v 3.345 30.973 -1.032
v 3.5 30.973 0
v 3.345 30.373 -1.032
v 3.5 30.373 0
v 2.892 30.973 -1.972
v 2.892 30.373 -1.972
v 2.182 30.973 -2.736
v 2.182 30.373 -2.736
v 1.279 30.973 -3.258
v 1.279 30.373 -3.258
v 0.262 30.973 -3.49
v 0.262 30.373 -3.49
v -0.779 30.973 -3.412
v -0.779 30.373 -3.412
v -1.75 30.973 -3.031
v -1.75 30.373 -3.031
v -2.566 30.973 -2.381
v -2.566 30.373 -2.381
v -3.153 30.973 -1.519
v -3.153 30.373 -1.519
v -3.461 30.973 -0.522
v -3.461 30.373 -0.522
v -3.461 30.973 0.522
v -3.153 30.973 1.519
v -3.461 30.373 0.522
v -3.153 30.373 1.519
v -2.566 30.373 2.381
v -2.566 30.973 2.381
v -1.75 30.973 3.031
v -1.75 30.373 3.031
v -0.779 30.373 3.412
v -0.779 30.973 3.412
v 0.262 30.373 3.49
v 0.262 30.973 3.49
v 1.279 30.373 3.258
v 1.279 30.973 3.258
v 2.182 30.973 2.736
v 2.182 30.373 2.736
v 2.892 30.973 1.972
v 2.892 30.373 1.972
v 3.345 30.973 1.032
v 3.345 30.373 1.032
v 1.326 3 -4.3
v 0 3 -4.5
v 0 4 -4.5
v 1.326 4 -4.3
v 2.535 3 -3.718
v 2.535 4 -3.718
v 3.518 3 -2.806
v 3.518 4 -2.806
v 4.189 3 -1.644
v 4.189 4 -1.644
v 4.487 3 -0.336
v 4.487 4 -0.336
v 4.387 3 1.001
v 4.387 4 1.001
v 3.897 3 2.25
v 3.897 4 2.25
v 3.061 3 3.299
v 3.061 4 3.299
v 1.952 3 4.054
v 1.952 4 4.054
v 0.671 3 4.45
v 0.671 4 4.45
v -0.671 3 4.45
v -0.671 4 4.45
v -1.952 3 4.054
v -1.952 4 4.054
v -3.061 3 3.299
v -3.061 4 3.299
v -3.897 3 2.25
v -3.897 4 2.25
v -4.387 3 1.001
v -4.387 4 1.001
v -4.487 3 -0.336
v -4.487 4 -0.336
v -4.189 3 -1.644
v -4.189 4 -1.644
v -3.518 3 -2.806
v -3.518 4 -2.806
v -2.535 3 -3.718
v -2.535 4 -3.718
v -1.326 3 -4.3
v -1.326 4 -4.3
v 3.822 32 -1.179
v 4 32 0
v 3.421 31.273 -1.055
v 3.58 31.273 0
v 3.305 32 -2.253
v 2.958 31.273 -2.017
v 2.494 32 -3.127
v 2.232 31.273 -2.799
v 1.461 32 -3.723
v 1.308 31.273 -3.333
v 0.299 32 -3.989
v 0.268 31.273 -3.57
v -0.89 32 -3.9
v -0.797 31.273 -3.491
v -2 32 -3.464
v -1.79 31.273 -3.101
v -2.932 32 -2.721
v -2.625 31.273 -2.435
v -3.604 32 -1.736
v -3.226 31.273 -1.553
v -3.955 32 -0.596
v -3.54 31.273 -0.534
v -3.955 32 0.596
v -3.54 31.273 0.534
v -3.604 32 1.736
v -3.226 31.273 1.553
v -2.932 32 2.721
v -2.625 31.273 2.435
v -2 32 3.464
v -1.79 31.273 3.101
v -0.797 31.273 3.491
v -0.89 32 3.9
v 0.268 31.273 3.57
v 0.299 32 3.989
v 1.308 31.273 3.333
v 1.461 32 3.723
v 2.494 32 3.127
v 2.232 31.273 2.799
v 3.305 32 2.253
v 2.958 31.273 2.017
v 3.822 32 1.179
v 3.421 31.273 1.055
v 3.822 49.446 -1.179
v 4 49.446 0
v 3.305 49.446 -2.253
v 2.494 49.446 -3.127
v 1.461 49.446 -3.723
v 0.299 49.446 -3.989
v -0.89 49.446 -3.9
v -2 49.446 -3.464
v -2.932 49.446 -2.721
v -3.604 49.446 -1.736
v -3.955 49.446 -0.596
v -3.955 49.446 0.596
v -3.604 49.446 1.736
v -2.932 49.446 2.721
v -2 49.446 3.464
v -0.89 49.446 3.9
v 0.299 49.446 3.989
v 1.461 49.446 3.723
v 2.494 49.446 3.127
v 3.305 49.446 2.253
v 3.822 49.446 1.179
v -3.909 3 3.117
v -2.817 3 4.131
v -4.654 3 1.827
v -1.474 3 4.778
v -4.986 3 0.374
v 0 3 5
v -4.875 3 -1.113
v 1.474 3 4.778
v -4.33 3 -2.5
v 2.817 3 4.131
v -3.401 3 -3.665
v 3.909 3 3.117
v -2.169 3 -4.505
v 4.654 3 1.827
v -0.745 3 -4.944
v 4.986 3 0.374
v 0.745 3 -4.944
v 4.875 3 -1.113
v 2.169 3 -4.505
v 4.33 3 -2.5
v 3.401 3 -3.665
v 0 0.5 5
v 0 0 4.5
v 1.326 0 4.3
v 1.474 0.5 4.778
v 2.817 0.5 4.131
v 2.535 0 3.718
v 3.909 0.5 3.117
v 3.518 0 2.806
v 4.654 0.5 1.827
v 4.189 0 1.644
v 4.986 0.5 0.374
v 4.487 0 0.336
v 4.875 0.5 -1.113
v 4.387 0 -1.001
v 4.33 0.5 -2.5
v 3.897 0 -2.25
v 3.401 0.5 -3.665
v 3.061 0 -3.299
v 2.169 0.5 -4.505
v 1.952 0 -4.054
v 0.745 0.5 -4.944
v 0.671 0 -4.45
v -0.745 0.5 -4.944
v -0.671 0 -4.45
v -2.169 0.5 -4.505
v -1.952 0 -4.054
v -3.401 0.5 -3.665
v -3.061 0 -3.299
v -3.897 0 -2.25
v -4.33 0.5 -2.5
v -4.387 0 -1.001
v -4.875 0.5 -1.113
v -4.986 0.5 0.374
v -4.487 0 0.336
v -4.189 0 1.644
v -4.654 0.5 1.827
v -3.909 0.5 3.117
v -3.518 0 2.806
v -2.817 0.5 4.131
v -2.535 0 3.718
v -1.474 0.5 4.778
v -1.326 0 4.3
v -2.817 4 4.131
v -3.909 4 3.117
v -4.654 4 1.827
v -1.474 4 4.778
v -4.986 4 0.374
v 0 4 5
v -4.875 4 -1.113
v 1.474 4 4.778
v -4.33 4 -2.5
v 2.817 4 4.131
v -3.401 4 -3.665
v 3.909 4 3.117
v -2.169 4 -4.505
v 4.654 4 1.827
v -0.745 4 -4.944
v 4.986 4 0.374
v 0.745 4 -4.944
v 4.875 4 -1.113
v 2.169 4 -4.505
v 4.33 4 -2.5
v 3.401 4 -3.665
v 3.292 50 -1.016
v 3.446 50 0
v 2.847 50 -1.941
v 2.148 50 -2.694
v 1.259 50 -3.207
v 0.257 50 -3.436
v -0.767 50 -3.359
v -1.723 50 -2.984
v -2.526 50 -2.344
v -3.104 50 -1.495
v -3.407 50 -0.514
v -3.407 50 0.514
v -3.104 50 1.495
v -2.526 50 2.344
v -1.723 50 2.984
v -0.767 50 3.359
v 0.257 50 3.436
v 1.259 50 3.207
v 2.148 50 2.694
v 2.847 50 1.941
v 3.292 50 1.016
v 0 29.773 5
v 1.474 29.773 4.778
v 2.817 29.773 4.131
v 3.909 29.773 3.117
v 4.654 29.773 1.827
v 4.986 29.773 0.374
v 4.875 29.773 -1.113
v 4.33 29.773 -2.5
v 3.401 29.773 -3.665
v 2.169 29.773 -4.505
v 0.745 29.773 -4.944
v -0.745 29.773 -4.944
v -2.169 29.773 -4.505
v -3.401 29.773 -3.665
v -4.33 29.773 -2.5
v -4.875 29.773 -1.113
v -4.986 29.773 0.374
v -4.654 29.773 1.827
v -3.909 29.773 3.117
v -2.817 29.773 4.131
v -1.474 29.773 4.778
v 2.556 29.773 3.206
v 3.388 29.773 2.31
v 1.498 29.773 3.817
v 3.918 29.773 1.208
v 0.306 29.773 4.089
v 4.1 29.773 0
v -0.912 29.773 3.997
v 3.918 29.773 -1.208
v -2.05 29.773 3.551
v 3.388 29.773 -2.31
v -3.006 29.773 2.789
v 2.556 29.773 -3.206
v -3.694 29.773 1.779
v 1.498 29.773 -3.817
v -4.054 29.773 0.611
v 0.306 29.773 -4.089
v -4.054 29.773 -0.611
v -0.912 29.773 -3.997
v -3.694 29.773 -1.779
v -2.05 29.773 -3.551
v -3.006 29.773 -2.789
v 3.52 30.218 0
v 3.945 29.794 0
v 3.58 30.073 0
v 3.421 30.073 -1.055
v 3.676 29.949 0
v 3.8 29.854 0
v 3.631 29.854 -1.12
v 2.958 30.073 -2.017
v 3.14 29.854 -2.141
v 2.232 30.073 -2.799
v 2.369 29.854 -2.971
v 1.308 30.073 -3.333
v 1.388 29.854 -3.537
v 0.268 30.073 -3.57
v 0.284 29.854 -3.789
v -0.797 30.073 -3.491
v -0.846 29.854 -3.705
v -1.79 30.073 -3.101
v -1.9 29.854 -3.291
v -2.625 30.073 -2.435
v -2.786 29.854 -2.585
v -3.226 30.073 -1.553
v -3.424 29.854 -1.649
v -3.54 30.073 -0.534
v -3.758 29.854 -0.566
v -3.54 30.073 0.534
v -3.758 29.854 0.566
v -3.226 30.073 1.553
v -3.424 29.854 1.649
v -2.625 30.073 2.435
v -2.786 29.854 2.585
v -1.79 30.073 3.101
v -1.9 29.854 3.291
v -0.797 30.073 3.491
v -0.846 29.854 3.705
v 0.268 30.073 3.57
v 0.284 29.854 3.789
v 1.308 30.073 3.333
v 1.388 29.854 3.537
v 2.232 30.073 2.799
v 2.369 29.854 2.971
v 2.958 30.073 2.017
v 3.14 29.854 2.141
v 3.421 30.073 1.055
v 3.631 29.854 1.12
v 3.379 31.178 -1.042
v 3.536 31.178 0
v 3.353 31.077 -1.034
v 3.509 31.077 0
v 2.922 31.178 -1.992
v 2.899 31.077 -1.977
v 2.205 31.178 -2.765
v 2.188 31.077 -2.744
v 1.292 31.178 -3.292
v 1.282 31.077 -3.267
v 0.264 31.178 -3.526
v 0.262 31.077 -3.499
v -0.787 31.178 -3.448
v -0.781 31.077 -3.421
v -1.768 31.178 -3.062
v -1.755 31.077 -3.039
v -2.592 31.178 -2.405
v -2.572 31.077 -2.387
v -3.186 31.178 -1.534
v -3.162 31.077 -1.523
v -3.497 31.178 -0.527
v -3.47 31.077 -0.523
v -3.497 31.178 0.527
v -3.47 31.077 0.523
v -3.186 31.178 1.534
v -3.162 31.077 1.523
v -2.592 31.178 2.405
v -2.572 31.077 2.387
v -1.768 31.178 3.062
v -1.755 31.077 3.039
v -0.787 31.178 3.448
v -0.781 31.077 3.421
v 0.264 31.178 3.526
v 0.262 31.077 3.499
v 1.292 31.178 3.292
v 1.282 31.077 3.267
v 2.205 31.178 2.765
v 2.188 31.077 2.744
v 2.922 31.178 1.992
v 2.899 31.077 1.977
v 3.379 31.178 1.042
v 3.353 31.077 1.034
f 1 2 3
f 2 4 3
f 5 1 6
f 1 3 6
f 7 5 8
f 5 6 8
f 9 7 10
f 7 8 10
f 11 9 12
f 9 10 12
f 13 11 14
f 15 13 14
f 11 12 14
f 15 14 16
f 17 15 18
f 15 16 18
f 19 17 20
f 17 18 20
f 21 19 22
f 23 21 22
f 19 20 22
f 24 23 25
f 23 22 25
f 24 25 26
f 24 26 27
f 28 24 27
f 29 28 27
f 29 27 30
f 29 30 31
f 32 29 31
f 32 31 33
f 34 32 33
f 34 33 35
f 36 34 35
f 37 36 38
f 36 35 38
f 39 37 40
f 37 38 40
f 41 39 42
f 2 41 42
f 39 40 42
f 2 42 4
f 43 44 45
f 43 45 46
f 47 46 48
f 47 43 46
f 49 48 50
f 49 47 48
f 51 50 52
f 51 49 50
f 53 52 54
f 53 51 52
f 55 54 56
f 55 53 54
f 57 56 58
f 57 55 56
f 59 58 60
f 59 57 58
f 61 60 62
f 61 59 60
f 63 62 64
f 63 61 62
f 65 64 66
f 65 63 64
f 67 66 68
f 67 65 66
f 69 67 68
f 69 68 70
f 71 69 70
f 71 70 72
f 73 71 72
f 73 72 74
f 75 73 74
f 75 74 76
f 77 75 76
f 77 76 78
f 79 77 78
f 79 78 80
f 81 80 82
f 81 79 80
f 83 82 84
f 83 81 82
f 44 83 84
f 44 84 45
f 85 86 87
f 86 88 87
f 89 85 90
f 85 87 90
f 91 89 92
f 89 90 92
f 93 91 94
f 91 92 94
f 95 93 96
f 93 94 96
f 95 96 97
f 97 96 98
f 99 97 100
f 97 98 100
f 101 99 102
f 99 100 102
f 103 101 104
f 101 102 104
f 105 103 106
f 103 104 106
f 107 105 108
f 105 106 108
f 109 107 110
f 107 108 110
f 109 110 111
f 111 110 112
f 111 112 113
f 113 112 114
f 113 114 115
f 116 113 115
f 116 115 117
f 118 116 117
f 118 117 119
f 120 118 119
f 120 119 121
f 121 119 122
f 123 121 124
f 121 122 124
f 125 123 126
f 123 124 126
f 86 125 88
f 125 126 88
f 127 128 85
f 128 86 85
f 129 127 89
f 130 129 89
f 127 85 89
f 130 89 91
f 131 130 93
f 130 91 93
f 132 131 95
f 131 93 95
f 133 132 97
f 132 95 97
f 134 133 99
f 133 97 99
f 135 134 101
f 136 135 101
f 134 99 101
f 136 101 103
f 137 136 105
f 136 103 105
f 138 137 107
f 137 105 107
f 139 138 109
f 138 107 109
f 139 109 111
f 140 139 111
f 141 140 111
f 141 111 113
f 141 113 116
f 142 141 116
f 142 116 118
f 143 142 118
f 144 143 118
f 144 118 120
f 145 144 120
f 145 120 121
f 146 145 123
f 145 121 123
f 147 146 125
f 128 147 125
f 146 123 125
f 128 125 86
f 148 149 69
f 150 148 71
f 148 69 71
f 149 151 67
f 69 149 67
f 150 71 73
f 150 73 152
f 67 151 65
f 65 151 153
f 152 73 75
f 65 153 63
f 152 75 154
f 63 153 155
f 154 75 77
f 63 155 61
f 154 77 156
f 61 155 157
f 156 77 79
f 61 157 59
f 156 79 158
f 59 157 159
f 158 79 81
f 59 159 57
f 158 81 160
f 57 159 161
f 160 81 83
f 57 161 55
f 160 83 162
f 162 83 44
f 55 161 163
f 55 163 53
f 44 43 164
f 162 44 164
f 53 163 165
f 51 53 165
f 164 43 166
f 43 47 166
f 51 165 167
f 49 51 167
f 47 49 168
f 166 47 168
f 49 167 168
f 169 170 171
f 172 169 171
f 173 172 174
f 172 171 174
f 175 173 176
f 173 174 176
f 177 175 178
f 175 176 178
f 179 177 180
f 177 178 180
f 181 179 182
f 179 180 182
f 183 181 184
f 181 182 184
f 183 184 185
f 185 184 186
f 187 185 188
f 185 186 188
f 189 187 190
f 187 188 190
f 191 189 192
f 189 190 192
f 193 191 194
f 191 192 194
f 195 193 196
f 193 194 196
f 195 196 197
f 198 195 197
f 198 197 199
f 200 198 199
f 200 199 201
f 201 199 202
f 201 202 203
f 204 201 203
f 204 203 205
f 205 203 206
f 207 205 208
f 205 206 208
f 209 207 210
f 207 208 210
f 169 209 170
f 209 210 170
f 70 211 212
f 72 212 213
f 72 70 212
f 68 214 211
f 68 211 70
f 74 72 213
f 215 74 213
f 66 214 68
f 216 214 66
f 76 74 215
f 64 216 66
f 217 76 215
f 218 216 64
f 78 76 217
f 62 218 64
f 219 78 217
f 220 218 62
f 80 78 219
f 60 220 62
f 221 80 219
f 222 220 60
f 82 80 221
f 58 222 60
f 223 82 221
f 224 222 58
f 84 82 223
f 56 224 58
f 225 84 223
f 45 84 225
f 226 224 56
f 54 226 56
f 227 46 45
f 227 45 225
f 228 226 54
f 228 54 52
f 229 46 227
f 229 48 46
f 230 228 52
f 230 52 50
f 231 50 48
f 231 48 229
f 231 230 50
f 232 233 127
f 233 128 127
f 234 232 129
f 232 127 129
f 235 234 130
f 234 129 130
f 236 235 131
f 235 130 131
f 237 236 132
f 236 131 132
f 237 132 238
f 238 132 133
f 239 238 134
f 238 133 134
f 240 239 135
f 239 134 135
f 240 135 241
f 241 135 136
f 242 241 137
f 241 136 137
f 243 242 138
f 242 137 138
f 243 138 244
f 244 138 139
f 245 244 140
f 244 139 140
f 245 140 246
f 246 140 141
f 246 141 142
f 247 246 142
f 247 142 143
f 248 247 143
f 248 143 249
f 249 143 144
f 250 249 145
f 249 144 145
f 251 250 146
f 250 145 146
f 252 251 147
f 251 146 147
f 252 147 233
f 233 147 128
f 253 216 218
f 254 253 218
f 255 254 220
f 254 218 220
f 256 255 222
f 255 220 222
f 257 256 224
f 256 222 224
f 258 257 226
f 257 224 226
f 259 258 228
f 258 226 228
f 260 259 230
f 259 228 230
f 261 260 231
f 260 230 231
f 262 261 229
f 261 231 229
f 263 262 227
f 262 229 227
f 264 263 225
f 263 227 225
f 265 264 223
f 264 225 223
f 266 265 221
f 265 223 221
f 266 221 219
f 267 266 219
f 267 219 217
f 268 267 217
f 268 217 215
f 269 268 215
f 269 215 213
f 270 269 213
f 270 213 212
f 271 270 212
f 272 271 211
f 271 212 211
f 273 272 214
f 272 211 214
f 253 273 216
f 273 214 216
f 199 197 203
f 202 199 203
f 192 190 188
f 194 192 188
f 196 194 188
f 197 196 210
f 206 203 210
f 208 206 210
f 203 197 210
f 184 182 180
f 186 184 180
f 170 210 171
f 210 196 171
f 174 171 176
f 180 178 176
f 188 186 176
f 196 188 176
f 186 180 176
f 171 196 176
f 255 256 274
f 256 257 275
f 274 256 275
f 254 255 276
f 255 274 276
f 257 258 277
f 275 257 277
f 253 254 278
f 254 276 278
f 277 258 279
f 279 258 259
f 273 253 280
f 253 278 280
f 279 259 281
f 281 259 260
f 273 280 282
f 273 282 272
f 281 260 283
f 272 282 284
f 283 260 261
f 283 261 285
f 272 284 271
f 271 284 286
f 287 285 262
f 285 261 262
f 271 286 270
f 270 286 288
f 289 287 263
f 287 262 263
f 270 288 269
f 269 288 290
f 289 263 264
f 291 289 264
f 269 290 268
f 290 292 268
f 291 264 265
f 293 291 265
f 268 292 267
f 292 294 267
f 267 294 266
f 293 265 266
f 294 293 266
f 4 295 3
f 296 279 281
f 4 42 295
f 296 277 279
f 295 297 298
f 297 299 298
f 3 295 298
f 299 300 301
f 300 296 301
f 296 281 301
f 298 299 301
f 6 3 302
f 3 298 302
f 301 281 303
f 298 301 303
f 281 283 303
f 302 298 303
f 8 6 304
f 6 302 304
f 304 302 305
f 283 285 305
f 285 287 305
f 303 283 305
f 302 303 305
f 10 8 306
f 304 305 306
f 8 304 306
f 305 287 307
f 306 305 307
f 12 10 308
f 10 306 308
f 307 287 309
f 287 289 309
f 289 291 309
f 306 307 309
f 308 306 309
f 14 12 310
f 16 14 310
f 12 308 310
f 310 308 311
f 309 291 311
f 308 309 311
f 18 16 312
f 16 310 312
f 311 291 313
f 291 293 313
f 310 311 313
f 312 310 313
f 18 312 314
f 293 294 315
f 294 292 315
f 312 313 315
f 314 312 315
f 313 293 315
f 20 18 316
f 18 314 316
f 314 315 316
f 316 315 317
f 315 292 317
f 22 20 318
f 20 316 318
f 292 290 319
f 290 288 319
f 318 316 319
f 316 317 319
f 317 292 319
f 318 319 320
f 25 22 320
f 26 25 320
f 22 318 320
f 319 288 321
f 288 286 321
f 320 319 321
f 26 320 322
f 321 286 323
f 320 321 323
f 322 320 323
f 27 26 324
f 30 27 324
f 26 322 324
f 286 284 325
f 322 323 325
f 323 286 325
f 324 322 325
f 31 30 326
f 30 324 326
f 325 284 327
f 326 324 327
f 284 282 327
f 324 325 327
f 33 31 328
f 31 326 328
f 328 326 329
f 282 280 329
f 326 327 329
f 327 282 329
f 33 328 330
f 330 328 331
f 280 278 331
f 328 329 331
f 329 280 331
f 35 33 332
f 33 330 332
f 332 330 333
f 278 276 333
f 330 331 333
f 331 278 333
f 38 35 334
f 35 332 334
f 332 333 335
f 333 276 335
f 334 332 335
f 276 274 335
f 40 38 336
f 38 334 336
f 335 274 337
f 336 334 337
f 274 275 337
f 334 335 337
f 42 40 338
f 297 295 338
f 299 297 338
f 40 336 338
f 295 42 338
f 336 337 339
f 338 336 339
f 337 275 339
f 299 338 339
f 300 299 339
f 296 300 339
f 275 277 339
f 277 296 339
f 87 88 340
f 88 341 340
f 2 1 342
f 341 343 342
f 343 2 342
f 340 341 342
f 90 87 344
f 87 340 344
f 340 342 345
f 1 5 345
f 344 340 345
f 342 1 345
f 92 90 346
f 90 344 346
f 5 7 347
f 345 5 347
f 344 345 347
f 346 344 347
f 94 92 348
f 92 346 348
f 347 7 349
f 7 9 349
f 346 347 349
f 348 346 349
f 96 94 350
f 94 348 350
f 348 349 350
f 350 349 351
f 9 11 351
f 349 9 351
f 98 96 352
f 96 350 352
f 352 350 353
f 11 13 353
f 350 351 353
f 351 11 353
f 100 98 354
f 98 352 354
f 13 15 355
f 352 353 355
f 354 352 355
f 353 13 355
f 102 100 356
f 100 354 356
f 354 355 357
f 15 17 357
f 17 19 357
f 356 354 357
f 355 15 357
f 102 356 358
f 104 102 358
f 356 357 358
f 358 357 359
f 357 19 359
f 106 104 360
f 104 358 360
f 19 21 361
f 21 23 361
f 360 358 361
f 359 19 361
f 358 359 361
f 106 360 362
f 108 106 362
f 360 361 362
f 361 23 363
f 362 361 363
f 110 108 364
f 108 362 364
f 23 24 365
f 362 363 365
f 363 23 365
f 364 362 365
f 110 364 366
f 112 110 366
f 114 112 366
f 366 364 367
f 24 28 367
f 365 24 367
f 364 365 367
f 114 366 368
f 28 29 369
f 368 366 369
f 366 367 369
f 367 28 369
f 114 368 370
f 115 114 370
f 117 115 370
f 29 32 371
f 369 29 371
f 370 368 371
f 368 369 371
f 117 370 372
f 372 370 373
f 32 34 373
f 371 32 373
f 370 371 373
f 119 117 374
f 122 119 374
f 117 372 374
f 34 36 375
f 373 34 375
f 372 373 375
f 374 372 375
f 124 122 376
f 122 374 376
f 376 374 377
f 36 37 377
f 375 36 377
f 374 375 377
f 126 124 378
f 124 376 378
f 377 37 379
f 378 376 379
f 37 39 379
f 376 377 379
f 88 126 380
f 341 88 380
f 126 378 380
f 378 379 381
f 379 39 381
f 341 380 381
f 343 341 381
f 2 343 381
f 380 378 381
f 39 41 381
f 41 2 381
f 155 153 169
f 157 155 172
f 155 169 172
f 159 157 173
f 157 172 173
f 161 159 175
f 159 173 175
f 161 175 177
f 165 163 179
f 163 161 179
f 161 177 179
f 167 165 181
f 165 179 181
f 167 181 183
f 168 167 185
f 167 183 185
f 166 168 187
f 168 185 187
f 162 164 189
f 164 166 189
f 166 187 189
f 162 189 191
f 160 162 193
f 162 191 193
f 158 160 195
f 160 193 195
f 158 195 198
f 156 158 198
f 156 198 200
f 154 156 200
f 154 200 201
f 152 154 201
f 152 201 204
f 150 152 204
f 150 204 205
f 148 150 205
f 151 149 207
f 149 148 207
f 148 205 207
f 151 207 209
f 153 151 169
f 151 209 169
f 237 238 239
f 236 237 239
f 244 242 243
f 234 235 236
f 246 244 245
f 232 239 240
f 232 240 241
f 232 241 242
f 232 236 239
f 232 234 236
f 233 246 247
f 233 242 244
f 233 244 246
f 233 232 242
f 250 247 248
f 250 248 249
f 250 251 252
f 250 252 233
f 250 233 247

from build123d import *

# Parameters (mm, degrees)
SKETCH1_R           = 5
BOSS_EXTRUDE1_DEPTH = 50
CHAMFER1_SIZE       = 0.5
CUT_EXTRUDE2_START  = -3
SKETCH7_R           = 5
SKETCH7_R_2         = 4.5
CUT_EXTRUDE2_DEPTH  = 1


# Read off the part's stored shape, not the designer's step: M8x1.0 Machine Threads Stud1
with BuildPart() as part:
    # Sketch1 → Boss-Extrude1 (new body)
    with BuildSketch(Plane(origin=(0, 0, 0), x_dir=(1, 0, 0), z_dir=(0, 1, 0))):
        with Locations(Location((0, 0, 0), (0, 0, 270))):
            Circle(SKETCH1_R)
    extrude(amount=BOSS_EXTRUDE1_DEPTH)

    # M8x1.0 Machine Threads Stud1 outline → M8x1.0 Machine Threads Stud1 (revolve, cut)
    with BuildSketch(Plane.XY):
        with BuildLine():
            Line((5, 50), (3.4455, 50))
            Line((3.4455, 50), (4, 49.4455))
            Line((4, 49.4455), (4, 32))
            Line((4, 32), (3.580384758, 31.273205081))
            ThreePointArc((3.580384758, 31.273205081), (3.520444504, 31.128496508), (3.5, 30.973205081))
            Line((3.5, 30.973205081), (3.5, 30.373205081))
            ThreePointArc((3.5, 30.373205081), (3.675735931, 29.948941012), (4.1, 29.773205081))
            Line((4.1, 29.773205081), (5, 29.773205081))
            Line((5, 29.773205081), (5, 50))
        make_face()
    revolve(axis=Axis((0, 0, 0), (0, 1, 0)), mode=Mode.SUBTRACT)

    # Chamfer1
    chamfer1_edges = [part.edges().sort_by_distance(p)[0] for p in [
        (0, 0, -5),
    ]]
    chamfer(chamfer1_edges, length=CHAMFER1_SIZE)

    # Sketch7 → Cut-Extrude2 (cut)
    with BuildSketch(Plane.XZ.offset(CUT_EXTRUDE2_START)):
        with Locations(Location((0, 0, 0), (0, 0, 270))):
            Circle(SKETCH7_R)
        with Locations(Location((0, 0, 0), (0, 0, 270))):
            Circle(SKETCH7_R_2, mode=Mode.SUBTRACT)
    extrude(amount=-CUT_EXTRUDE2_DEPTH, mode=Mode.SUBTRACT)


solid = part.part
